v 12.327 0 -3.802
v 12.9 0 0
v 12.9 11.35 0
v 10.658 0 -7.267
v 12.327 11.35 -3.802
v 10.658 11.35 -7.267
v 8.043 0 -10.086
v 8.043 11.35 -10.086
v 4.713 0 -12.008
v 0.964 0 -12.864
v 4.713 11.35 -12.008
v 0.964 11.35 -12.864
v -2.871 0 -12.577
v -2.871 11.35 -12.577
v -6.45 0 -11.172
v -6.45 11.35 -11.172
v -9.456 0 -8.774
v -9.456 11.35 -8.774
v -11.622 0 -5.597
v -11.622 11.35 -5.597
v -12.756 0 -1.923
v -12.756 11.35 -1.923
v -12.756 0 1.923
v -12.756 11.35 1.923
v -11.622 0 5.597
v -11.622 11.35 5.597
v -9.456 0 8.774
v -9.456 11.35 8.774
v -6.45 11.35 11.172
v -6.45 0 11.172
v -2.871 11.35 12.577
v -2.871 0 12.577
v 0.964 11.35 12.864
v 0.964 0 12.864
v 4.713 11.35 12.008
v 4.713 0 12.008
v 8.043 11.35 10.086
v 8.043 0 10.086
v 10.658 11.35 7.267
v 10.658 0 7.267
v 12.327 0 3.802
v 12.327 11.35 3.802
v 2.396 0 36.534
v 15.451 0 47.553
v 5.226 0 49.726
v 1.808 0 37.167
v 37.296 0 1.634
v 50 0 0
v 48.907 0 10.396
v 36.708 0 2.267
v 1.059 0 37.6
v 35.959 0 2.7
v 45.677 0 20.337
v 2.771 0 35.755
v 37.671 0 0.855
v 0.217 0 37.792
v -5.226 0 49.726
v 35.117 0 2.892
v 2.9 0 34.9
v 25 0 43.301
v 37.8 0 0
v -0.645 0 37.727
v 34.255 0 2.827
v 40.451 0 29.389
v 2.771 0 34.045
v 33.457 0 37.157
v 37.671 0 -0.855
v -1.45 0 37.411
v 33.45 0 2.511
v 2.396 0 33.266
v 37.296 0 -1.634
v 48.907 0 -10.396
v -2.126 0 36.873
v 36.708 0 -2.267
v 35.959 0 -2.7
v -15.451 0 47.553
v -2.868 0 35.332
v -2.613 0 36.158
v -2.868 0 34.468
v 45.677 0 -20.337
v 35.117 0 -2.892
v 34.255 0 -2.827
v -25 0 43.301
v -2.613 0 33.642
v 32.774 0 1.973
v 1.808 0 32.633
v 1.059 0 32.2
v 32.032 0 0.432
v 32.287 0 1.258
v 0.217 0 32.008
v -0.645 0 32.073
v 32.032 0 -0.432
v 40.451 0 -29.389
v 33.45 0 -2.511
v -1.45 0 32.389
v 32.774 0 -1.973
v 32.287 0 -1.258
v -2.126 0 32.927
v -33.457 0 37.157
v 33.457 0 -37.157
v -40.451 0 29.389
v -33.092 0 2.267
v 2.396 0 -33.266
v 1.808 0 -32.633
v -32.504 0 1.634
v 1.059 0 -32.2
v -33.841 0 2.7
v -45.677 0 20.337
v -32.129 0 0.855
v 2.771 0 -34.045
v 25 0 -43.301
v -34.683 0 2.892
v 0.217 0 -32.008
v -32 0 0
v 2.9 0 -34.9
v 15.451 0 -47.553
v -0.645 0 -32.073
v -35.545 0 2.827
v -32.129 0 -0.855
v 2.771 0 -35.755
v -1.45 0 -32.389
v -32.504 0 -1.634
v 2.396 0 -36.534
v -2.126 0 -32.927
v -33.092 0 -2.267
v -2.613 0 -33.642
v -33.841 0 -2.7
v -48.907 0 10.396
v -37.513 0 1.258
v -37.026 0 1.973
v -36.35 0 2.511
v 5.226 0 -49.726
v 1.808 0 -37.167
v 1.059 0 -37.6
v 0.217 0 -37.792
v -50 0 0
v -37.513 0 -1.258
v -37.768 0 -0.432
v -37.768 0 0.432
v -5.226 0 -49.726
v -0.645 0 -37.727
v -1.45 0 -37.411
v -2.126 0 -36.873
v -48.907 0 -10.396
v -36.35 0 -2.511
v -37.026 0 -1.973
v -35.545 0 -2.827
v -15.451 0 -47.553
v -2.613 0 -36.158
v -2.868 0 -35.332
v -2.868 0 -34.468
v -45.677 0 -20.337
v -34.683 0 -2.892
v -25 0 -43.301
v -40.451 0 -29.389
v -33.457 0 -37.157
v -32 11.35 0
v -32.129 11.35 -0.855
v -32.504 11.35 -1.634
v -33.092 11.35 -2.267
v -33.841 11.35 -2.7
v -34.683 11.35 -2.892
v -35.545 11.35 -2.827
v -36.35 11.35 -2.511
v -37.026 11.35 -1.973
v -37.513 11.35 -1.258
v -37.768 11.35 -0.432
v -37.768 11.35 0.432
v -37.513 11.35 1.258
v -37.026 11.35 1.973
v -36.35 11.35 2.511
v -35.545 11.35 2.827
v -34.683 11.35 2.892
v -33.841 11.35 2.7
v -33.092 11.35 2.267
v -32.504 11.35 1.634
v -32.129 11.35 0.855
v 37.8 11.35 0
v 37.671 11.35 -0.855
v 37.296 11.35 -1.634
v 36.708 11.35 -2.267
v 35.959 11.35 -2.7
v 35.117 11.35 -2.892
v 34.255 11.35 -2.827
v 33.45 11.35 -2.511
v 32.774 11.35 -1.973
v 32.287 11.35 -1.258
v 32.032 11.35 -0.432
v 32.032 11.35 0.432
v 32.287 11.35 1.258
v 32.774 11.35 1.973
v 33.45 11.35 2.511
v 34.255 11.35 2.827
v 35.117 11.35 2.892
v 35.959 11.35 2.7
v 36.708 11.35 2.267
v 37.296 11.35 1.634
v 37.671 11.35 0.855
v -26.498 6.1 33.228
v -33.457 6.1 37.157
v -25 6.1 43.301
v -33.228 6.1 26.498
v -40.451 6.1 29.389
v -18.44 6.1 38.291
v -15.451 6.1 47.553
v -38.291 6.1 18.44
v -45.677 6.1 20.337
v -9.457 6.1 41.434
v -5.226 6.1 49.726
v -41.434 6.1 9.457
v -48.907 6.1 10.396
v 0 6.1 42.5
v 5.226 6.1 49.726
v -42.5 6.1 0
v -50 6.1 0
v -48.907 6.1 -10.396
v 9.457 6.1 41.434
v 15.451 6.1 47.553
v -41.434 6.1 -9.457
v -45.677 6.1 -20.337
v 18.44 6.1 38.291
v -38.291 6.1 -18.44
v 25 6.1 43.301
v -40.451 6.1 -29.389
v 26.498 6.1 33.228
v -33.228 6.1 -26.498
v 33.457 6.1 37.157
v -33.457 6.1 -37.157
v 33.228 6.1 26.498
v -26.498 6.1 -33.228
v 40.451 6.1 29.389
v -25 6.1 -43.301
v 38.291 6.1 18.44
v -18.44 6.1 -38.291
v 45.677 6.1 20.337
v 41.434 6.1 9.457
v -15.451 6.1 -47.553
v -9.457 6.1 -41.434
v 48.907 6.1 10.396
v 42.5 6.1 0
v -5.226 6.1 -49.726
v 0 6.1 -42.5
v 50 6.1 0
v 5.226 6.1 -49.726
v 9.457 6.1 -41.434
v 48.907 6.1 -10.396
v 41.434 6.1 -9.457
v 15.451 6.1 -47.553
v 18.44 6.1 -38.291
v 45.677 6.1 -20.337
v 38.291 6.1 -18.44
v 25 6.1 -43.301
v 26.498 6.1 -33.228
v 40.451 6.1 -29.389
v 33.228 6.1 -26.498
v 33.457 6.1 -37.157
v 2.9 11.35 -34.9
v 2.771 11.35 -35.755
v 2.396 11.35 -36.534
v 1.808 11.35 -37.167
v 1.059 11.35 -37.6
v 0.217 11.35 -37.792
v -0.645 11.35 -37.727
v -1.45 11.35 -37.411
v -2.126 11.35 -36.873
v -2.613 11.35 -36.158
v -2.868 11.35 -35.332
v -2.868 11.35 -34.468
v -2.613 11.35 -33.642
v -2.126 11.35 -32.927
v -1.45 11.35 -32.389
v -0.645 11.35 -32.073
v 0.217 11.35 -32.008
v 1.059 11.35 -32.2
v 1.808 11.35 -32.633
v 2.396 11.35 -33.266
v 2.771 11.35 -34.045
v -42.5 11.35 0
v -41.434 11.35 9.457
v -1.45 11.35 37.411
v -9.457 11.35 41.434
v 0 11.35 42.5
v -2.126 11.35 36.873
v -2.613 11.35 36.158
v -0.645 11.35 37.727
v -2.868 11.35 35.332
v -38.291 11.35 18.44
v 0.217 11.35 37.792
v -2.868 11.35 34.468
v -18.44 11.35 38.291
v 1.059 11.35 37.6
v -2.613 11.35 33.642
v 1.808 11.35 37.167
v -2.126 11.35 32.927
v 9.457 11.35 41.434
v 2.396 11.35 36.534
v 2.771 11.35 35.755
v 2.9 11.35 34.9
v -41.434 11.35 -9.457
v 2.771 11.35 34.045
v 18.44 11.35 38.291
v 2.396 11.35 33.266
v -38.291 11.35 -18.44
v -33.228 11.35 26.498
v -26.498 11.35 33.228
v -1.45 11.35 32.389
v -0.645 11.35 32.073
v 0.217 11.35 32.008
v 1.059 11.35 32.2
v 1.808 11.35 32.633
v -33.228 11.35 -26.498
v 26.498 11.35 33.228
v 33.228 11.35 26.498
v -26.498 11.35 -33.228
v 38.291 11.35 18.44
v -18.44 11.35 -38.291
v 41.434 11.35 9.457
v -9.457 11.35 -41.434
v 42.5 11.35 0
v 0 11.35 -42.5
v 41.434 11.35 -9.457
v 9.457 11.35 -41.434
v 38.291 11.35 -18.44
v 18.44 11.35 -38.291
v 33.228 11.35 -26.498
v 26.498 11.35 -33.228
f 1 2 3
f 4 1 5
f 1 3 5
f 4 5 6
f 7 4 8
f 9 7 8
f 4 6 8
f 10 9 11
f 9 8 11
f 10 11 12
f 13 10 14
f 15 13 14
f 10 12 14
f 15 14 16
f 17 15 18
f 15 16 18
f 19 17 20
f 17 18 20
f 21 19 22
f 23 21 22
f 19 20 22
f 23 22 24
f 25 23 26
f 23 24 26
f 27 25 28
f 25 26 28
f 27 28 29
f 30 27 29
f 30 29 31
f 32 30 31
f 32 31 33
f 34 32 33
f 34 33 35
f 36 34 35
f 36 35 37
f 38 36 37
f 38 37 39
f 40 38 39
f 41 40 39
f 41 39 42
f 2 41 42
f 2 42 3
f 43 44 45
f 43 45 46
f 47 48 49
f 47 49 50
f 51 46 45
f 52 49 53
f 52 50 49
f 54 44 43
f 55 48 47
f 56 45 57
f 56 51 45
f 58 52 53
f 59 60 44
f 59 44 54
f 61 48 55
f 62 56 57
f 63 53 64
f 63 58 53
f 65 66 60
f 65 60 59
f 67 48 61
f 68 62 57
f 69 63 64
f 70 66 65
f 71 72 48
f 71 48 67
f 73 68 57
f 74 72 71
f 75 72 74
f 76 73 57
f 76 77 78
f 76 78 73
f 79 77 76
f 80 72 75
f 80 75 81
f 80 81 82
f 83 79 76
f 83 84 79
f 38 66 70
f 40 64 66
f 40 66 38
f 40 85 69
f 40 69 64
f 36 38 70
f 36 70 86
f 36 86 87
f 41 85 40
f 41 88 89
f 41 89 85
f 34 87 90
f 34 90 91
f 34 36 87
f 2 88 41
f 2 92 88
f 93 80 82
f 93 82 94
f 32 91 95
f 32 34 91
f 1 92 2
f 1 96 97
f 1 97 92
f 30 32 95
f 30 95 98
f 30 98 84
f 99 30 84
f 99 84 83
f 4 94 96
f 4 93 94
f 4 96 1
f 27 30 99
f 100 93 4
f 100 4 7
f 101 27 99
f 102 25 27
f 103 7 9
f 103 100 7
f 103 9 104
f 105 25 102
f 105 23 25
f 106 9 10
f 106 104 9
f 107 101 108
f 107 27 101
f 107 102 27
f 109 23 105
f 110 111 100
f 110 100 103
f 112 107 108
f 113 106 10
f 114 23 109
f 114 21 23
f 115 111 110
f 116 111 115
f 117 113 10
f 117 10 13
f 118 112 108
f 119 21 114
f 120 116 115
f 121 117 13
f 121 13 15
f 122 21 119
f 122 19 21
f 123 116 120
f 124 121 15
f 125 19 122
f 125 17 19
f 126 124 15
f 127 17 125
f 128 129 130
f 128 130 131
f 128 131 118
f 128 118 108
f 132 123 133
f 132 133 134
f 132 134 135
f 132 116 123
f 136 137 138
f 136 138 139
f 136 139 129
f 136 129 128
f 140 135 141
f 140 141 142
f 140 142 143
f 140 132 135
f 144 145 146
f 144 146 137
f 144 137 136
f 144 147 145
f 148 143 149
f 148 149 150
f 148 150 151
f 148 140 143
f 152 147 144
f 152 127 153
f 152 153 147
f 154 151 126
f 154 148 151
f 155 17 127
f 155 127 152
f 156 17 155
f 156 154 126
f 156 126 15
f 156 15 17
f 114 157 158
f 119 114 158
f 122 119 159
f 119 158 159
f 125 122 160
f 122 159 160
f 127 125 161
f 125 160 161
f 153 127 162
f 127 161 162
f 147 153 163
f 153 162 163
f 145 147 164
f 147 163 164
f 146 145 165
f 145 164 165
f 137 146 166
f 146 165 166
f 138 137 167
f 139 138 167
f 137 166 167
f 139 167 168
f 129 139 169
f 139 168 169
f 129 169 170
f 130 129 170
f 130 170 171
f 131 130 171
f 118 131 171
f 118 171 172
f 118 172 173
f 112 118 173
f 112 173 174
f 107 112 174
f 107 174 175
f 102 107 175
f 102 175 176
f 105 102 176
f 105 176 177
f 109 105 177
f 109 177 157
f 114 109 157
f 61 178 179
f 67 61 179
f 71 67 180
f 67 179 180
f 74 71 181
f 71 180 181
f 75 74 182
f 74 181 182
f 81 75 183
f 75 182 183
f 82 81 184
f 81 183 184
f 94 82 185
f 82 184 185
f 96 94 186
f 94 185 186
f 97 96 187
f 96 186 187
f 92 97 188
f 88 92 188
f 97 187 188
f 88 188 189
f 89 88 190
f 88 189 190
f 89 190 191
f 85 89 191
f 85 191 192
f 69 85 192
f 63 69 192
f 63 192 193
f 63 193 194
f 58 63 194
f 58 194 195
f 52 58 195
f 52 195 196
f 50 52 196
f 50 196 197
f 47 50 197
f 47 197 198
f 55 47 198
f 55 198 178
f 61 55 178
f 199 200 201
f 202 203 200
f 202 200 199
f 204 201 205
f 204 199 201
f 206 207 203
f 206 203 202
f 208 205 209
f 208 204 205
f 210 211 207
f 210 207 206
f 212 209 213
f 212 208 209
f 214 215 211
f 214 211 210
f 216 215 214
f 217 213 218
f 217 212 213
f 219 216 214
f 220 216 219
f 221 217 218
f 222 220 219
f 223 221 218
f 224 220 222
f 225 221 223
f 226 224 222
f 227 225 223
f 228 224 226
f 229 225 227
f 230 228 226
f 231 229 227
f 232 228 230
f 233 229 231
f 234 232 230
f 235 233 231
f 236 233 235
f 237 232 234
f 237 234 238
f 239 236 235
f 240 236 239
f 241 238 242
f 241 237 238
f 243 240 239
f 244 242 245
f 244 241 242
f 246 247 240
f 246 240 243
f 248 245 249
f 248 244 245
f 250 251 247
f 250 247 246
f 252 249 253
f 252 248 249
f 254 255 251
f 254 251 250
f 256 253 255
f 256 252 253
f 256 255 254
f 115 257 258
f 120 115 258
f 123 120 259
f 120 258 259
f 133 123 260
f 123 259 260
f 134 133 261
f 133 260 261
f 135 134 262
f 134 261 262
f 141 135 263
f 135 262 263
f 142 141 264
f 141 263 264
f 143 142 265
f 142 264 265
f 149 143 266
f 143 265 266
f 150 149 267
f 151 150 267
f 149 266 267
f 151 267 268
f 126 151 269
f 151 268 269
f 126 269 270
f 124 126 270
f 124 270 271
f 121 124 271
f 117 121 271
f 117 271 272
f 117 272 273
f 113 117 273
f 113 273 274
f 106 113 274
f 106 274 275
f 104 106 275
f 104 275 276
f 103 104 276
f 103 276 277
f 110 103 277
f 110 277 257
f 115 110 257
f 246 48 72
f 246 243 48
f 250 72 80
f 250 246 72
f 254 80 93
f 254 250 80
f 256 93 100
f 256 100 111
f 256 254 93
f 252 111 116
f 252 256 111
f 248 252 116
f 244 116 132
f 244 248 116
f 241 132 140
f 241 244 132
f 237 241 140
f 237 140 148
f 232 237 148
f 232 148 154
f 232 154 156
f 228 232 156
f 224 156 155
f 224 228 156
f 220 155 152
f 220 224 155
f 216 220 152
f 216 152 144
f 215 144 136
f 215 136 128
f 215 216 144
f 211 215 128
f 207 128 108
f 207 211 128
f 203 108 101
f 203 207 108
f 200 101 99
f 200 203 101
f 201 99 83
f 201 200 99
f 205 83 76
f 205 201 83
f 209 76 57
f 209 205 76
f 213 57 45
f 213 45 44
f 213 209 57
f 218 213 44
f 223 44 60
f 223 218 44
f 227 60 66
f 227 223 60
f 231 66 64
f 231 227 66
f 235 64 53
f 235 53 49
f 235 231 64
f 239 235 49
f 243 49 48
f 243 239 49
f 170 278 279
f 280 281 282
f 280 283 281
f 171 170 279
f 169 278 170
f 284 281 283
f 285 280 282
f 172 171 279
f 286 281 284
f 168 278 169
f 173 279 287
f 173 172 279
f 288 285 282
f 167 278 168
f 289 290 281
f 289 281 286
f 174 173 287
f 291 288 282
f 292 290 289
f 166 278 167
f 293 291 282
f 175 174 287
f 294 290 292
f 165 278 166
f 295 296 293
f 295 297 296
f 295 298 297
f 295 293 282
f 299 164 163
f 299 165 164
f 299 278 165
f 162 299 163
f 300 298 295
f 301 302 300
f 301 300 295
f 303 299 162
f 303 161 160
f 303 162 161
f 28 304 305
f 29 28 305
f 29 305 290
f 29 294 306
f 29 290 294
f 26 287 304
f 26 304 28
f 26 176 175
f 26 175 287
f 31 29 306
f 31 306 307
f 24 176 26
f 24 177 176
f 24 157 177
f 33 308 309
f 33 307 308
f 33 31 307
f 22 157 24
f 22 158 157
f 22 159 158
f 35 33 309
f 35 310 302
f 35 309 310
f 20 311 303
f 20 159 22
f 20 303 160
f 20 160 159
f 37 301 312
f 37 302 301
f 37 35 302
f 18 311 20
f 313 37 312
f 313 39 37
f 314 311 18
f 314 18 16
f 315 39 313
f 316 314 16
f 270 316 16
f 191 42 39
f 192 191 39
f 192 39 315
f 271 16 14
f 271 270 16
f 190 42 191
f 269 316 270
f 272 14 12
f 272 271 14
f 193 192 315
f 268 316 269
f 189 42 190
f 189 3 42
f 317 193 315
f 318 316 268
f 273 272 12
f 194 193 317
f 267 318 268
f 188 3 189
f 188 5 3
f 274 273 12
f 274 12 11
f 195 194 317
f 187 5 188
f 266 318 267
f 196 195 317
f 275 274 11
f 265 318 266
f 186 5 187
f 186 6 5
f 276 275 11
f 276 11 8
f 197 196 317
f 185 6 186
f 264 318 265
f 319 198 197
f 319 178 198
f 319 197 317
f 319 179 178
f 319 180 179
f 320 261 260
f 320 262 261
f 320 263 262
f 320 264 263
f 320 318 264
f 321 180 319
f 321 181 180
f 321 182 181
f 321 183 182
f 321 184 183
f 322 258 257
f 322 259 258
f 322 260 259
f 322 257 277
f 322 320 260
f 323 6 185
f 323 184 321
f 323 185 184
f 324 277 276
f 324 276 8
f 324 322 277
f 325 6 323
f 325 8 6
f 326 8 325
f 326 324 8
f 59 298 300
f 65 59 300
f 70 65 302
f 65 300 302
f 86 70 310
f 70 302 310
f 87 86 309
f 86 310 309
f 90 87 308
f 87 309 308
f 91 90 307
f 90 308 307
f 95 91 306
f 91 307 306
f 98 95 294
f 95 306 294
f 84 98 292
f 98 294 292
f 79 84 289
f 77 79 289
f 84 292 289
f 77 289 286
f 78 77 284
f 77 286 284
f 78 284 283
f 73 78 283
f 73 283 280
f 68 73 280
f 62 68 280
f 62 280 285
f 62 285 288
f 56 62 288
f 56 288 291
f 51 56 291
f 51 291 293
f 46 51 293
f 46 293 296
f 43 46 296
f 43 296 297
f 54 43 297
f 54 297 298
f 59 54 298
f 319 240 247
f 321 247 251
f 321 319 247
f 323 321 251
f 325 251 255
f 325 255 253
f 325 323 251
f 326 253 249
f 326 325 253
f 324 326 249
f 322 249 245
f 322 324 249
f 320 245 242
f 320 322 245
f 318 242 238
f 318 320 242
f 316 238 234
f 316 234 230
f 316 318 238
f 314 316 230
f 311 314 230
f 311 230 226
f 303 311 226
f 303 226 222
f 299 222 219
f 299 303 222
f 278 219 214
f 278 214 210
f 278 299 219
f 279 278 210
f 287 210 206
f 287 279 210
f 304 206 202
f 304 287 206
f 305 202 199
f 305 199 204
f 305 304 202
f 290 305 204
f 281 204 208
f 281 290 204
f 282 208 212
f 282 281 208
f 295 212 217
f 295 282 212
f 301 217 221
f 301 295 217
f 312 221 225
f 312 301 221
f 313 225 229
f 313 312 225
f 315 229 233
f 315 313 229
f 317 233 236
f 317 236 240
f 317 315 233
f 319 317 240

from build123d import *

# Parameters (mm, degrees)
CUT_EXTRUDE1_REACH = 13.35
SKETCH2_R          = 12.9
SKETCH2_R_2        = 2.9


with BuildPart() as part:
    # Sketch1 → Revolve1 (revolve)
    with BuildSketch(Plane.XY):
        Polygon((0, 0), (50, 0), (50, 6.1), (42.5, 6.1), (42.5, 11.35), (0, 11.35), align=None)
    revolve(axis=Axis((0, 0, 0), (0, 1, 0)))

    # Sketch2 → Cut-Extrude1 (cut, up to next)
    with BuildSketch(Plane(origin=(0, 11.35, 0), x_dir=(1, 0, 0), z_dir=(0, 1, 0)), mode=Mode.PRIVATE) as cut_extrude1_sk1:
        Circle(SKETCH2_R)
    cut_extrude1_tool1 = extrude(cut_extrude1_sk1.sketch, amount=-CUT_EXTRUDE1_REACH, mode=Mode.PRIVATE) & part.part
    add(cut_extrude1_tool1.solids().sort_by_distance((0, 11.35, 0))[0], mode=Mode.SUBTRACT)
    # Sketch2 → Cut-Extrude1 (cut, up to next)
    with BuildSketch(Plane(origin=(0, 11.35, 0), x_dir=(1, 0, 0), z_dir=(0, 1, 0)), mode=Mode.PRIVATE) as cut_extrude1_sk2:
        with Locations((0, 34.9)):
            Circle(SKETCH2_R_2)
    cut_extrude1_tool2 = extrude(cut_extrude1_sk2.sketch, amount=-CUT_EXTRUDE1_REACH, mode=Mode.PRIVATE) & part.part
    add(cut_extrude1_tool2.solids().sort_by_distance((0, 11.35, -34.9))[0], mode=Mode.SUBTRACT)
    # Sketch2 → Cut-Extrude1 (cut, up to next)
    with BuildSketch(Plane(origin=(0, 11.35, 0), x_dir=(1, 0, 0), z_dir=(0, 1, 0)), mode=Mode.PRIVATE) as cut_extrude1_sk3:
        with Locations((34.9, 0)):
            Circle(SKETCH2_R_2)
    cut_extrude1_tool3 = extrude(cut_extrude1_sk3.sketch, amount=-CUT_EXTRUDE1_REACH, mode=Mode.PRIVATE) & part.part
    add(cut_extrude1_tool3.solids().sort_by_distance((34.9, 11.35, 0))[0], mode=Mode.SUBTRACT)
    # Sketch2 → Cut-Extrude1 (cut, up to next)
    with BuildSketch(Plane(origin=(0, 11.35, 0), x_dir=(1, 0, 0), z_dir=(0, 1, 0)), mode=Mode.PRIVATE) as cut_extrude1_sk4:
        with Locations((0, -34.9)):
            Circle(SKETCH2_R_2)
    cut_extrude1_tool4 = extrude(cut_extrude1_sk4.sketch, amount=-CUT_EXTRUDE1_REACH, mode=Mode.PRIVATE) & part.part
    add(cut_extrude1_tool4.solids().sort_by_distance((0, 11.35, 34.9))[0], mode=Mode.SUBTRACT)
    # Sketch2 → Cut-Extrude1 (cut, up to next)
    with BuildSketch(Plane(origin=(0, 11.35, 0), x_dir=(1, 0, 0), z_dir=(0, 1, 0)), mode=Mode.PRIVATE) as cut_extrude1_sk5:
        with Locations((-34.9, 0)):
            Circle(SKETCH2_R_2)
    cut_extrude1_tool5 = extrude(cut_extrude1_sk5.sketch, amount=-CUT_EXTRUDE1_REACH, mode=Mode.PRIVATE) & part.part
    add(cut_extrude1_tool5.solids().sort_by_distance((-34.9, 11.35, 0))[0], mode=Mode.SUBTRACT)


solid = part.part
